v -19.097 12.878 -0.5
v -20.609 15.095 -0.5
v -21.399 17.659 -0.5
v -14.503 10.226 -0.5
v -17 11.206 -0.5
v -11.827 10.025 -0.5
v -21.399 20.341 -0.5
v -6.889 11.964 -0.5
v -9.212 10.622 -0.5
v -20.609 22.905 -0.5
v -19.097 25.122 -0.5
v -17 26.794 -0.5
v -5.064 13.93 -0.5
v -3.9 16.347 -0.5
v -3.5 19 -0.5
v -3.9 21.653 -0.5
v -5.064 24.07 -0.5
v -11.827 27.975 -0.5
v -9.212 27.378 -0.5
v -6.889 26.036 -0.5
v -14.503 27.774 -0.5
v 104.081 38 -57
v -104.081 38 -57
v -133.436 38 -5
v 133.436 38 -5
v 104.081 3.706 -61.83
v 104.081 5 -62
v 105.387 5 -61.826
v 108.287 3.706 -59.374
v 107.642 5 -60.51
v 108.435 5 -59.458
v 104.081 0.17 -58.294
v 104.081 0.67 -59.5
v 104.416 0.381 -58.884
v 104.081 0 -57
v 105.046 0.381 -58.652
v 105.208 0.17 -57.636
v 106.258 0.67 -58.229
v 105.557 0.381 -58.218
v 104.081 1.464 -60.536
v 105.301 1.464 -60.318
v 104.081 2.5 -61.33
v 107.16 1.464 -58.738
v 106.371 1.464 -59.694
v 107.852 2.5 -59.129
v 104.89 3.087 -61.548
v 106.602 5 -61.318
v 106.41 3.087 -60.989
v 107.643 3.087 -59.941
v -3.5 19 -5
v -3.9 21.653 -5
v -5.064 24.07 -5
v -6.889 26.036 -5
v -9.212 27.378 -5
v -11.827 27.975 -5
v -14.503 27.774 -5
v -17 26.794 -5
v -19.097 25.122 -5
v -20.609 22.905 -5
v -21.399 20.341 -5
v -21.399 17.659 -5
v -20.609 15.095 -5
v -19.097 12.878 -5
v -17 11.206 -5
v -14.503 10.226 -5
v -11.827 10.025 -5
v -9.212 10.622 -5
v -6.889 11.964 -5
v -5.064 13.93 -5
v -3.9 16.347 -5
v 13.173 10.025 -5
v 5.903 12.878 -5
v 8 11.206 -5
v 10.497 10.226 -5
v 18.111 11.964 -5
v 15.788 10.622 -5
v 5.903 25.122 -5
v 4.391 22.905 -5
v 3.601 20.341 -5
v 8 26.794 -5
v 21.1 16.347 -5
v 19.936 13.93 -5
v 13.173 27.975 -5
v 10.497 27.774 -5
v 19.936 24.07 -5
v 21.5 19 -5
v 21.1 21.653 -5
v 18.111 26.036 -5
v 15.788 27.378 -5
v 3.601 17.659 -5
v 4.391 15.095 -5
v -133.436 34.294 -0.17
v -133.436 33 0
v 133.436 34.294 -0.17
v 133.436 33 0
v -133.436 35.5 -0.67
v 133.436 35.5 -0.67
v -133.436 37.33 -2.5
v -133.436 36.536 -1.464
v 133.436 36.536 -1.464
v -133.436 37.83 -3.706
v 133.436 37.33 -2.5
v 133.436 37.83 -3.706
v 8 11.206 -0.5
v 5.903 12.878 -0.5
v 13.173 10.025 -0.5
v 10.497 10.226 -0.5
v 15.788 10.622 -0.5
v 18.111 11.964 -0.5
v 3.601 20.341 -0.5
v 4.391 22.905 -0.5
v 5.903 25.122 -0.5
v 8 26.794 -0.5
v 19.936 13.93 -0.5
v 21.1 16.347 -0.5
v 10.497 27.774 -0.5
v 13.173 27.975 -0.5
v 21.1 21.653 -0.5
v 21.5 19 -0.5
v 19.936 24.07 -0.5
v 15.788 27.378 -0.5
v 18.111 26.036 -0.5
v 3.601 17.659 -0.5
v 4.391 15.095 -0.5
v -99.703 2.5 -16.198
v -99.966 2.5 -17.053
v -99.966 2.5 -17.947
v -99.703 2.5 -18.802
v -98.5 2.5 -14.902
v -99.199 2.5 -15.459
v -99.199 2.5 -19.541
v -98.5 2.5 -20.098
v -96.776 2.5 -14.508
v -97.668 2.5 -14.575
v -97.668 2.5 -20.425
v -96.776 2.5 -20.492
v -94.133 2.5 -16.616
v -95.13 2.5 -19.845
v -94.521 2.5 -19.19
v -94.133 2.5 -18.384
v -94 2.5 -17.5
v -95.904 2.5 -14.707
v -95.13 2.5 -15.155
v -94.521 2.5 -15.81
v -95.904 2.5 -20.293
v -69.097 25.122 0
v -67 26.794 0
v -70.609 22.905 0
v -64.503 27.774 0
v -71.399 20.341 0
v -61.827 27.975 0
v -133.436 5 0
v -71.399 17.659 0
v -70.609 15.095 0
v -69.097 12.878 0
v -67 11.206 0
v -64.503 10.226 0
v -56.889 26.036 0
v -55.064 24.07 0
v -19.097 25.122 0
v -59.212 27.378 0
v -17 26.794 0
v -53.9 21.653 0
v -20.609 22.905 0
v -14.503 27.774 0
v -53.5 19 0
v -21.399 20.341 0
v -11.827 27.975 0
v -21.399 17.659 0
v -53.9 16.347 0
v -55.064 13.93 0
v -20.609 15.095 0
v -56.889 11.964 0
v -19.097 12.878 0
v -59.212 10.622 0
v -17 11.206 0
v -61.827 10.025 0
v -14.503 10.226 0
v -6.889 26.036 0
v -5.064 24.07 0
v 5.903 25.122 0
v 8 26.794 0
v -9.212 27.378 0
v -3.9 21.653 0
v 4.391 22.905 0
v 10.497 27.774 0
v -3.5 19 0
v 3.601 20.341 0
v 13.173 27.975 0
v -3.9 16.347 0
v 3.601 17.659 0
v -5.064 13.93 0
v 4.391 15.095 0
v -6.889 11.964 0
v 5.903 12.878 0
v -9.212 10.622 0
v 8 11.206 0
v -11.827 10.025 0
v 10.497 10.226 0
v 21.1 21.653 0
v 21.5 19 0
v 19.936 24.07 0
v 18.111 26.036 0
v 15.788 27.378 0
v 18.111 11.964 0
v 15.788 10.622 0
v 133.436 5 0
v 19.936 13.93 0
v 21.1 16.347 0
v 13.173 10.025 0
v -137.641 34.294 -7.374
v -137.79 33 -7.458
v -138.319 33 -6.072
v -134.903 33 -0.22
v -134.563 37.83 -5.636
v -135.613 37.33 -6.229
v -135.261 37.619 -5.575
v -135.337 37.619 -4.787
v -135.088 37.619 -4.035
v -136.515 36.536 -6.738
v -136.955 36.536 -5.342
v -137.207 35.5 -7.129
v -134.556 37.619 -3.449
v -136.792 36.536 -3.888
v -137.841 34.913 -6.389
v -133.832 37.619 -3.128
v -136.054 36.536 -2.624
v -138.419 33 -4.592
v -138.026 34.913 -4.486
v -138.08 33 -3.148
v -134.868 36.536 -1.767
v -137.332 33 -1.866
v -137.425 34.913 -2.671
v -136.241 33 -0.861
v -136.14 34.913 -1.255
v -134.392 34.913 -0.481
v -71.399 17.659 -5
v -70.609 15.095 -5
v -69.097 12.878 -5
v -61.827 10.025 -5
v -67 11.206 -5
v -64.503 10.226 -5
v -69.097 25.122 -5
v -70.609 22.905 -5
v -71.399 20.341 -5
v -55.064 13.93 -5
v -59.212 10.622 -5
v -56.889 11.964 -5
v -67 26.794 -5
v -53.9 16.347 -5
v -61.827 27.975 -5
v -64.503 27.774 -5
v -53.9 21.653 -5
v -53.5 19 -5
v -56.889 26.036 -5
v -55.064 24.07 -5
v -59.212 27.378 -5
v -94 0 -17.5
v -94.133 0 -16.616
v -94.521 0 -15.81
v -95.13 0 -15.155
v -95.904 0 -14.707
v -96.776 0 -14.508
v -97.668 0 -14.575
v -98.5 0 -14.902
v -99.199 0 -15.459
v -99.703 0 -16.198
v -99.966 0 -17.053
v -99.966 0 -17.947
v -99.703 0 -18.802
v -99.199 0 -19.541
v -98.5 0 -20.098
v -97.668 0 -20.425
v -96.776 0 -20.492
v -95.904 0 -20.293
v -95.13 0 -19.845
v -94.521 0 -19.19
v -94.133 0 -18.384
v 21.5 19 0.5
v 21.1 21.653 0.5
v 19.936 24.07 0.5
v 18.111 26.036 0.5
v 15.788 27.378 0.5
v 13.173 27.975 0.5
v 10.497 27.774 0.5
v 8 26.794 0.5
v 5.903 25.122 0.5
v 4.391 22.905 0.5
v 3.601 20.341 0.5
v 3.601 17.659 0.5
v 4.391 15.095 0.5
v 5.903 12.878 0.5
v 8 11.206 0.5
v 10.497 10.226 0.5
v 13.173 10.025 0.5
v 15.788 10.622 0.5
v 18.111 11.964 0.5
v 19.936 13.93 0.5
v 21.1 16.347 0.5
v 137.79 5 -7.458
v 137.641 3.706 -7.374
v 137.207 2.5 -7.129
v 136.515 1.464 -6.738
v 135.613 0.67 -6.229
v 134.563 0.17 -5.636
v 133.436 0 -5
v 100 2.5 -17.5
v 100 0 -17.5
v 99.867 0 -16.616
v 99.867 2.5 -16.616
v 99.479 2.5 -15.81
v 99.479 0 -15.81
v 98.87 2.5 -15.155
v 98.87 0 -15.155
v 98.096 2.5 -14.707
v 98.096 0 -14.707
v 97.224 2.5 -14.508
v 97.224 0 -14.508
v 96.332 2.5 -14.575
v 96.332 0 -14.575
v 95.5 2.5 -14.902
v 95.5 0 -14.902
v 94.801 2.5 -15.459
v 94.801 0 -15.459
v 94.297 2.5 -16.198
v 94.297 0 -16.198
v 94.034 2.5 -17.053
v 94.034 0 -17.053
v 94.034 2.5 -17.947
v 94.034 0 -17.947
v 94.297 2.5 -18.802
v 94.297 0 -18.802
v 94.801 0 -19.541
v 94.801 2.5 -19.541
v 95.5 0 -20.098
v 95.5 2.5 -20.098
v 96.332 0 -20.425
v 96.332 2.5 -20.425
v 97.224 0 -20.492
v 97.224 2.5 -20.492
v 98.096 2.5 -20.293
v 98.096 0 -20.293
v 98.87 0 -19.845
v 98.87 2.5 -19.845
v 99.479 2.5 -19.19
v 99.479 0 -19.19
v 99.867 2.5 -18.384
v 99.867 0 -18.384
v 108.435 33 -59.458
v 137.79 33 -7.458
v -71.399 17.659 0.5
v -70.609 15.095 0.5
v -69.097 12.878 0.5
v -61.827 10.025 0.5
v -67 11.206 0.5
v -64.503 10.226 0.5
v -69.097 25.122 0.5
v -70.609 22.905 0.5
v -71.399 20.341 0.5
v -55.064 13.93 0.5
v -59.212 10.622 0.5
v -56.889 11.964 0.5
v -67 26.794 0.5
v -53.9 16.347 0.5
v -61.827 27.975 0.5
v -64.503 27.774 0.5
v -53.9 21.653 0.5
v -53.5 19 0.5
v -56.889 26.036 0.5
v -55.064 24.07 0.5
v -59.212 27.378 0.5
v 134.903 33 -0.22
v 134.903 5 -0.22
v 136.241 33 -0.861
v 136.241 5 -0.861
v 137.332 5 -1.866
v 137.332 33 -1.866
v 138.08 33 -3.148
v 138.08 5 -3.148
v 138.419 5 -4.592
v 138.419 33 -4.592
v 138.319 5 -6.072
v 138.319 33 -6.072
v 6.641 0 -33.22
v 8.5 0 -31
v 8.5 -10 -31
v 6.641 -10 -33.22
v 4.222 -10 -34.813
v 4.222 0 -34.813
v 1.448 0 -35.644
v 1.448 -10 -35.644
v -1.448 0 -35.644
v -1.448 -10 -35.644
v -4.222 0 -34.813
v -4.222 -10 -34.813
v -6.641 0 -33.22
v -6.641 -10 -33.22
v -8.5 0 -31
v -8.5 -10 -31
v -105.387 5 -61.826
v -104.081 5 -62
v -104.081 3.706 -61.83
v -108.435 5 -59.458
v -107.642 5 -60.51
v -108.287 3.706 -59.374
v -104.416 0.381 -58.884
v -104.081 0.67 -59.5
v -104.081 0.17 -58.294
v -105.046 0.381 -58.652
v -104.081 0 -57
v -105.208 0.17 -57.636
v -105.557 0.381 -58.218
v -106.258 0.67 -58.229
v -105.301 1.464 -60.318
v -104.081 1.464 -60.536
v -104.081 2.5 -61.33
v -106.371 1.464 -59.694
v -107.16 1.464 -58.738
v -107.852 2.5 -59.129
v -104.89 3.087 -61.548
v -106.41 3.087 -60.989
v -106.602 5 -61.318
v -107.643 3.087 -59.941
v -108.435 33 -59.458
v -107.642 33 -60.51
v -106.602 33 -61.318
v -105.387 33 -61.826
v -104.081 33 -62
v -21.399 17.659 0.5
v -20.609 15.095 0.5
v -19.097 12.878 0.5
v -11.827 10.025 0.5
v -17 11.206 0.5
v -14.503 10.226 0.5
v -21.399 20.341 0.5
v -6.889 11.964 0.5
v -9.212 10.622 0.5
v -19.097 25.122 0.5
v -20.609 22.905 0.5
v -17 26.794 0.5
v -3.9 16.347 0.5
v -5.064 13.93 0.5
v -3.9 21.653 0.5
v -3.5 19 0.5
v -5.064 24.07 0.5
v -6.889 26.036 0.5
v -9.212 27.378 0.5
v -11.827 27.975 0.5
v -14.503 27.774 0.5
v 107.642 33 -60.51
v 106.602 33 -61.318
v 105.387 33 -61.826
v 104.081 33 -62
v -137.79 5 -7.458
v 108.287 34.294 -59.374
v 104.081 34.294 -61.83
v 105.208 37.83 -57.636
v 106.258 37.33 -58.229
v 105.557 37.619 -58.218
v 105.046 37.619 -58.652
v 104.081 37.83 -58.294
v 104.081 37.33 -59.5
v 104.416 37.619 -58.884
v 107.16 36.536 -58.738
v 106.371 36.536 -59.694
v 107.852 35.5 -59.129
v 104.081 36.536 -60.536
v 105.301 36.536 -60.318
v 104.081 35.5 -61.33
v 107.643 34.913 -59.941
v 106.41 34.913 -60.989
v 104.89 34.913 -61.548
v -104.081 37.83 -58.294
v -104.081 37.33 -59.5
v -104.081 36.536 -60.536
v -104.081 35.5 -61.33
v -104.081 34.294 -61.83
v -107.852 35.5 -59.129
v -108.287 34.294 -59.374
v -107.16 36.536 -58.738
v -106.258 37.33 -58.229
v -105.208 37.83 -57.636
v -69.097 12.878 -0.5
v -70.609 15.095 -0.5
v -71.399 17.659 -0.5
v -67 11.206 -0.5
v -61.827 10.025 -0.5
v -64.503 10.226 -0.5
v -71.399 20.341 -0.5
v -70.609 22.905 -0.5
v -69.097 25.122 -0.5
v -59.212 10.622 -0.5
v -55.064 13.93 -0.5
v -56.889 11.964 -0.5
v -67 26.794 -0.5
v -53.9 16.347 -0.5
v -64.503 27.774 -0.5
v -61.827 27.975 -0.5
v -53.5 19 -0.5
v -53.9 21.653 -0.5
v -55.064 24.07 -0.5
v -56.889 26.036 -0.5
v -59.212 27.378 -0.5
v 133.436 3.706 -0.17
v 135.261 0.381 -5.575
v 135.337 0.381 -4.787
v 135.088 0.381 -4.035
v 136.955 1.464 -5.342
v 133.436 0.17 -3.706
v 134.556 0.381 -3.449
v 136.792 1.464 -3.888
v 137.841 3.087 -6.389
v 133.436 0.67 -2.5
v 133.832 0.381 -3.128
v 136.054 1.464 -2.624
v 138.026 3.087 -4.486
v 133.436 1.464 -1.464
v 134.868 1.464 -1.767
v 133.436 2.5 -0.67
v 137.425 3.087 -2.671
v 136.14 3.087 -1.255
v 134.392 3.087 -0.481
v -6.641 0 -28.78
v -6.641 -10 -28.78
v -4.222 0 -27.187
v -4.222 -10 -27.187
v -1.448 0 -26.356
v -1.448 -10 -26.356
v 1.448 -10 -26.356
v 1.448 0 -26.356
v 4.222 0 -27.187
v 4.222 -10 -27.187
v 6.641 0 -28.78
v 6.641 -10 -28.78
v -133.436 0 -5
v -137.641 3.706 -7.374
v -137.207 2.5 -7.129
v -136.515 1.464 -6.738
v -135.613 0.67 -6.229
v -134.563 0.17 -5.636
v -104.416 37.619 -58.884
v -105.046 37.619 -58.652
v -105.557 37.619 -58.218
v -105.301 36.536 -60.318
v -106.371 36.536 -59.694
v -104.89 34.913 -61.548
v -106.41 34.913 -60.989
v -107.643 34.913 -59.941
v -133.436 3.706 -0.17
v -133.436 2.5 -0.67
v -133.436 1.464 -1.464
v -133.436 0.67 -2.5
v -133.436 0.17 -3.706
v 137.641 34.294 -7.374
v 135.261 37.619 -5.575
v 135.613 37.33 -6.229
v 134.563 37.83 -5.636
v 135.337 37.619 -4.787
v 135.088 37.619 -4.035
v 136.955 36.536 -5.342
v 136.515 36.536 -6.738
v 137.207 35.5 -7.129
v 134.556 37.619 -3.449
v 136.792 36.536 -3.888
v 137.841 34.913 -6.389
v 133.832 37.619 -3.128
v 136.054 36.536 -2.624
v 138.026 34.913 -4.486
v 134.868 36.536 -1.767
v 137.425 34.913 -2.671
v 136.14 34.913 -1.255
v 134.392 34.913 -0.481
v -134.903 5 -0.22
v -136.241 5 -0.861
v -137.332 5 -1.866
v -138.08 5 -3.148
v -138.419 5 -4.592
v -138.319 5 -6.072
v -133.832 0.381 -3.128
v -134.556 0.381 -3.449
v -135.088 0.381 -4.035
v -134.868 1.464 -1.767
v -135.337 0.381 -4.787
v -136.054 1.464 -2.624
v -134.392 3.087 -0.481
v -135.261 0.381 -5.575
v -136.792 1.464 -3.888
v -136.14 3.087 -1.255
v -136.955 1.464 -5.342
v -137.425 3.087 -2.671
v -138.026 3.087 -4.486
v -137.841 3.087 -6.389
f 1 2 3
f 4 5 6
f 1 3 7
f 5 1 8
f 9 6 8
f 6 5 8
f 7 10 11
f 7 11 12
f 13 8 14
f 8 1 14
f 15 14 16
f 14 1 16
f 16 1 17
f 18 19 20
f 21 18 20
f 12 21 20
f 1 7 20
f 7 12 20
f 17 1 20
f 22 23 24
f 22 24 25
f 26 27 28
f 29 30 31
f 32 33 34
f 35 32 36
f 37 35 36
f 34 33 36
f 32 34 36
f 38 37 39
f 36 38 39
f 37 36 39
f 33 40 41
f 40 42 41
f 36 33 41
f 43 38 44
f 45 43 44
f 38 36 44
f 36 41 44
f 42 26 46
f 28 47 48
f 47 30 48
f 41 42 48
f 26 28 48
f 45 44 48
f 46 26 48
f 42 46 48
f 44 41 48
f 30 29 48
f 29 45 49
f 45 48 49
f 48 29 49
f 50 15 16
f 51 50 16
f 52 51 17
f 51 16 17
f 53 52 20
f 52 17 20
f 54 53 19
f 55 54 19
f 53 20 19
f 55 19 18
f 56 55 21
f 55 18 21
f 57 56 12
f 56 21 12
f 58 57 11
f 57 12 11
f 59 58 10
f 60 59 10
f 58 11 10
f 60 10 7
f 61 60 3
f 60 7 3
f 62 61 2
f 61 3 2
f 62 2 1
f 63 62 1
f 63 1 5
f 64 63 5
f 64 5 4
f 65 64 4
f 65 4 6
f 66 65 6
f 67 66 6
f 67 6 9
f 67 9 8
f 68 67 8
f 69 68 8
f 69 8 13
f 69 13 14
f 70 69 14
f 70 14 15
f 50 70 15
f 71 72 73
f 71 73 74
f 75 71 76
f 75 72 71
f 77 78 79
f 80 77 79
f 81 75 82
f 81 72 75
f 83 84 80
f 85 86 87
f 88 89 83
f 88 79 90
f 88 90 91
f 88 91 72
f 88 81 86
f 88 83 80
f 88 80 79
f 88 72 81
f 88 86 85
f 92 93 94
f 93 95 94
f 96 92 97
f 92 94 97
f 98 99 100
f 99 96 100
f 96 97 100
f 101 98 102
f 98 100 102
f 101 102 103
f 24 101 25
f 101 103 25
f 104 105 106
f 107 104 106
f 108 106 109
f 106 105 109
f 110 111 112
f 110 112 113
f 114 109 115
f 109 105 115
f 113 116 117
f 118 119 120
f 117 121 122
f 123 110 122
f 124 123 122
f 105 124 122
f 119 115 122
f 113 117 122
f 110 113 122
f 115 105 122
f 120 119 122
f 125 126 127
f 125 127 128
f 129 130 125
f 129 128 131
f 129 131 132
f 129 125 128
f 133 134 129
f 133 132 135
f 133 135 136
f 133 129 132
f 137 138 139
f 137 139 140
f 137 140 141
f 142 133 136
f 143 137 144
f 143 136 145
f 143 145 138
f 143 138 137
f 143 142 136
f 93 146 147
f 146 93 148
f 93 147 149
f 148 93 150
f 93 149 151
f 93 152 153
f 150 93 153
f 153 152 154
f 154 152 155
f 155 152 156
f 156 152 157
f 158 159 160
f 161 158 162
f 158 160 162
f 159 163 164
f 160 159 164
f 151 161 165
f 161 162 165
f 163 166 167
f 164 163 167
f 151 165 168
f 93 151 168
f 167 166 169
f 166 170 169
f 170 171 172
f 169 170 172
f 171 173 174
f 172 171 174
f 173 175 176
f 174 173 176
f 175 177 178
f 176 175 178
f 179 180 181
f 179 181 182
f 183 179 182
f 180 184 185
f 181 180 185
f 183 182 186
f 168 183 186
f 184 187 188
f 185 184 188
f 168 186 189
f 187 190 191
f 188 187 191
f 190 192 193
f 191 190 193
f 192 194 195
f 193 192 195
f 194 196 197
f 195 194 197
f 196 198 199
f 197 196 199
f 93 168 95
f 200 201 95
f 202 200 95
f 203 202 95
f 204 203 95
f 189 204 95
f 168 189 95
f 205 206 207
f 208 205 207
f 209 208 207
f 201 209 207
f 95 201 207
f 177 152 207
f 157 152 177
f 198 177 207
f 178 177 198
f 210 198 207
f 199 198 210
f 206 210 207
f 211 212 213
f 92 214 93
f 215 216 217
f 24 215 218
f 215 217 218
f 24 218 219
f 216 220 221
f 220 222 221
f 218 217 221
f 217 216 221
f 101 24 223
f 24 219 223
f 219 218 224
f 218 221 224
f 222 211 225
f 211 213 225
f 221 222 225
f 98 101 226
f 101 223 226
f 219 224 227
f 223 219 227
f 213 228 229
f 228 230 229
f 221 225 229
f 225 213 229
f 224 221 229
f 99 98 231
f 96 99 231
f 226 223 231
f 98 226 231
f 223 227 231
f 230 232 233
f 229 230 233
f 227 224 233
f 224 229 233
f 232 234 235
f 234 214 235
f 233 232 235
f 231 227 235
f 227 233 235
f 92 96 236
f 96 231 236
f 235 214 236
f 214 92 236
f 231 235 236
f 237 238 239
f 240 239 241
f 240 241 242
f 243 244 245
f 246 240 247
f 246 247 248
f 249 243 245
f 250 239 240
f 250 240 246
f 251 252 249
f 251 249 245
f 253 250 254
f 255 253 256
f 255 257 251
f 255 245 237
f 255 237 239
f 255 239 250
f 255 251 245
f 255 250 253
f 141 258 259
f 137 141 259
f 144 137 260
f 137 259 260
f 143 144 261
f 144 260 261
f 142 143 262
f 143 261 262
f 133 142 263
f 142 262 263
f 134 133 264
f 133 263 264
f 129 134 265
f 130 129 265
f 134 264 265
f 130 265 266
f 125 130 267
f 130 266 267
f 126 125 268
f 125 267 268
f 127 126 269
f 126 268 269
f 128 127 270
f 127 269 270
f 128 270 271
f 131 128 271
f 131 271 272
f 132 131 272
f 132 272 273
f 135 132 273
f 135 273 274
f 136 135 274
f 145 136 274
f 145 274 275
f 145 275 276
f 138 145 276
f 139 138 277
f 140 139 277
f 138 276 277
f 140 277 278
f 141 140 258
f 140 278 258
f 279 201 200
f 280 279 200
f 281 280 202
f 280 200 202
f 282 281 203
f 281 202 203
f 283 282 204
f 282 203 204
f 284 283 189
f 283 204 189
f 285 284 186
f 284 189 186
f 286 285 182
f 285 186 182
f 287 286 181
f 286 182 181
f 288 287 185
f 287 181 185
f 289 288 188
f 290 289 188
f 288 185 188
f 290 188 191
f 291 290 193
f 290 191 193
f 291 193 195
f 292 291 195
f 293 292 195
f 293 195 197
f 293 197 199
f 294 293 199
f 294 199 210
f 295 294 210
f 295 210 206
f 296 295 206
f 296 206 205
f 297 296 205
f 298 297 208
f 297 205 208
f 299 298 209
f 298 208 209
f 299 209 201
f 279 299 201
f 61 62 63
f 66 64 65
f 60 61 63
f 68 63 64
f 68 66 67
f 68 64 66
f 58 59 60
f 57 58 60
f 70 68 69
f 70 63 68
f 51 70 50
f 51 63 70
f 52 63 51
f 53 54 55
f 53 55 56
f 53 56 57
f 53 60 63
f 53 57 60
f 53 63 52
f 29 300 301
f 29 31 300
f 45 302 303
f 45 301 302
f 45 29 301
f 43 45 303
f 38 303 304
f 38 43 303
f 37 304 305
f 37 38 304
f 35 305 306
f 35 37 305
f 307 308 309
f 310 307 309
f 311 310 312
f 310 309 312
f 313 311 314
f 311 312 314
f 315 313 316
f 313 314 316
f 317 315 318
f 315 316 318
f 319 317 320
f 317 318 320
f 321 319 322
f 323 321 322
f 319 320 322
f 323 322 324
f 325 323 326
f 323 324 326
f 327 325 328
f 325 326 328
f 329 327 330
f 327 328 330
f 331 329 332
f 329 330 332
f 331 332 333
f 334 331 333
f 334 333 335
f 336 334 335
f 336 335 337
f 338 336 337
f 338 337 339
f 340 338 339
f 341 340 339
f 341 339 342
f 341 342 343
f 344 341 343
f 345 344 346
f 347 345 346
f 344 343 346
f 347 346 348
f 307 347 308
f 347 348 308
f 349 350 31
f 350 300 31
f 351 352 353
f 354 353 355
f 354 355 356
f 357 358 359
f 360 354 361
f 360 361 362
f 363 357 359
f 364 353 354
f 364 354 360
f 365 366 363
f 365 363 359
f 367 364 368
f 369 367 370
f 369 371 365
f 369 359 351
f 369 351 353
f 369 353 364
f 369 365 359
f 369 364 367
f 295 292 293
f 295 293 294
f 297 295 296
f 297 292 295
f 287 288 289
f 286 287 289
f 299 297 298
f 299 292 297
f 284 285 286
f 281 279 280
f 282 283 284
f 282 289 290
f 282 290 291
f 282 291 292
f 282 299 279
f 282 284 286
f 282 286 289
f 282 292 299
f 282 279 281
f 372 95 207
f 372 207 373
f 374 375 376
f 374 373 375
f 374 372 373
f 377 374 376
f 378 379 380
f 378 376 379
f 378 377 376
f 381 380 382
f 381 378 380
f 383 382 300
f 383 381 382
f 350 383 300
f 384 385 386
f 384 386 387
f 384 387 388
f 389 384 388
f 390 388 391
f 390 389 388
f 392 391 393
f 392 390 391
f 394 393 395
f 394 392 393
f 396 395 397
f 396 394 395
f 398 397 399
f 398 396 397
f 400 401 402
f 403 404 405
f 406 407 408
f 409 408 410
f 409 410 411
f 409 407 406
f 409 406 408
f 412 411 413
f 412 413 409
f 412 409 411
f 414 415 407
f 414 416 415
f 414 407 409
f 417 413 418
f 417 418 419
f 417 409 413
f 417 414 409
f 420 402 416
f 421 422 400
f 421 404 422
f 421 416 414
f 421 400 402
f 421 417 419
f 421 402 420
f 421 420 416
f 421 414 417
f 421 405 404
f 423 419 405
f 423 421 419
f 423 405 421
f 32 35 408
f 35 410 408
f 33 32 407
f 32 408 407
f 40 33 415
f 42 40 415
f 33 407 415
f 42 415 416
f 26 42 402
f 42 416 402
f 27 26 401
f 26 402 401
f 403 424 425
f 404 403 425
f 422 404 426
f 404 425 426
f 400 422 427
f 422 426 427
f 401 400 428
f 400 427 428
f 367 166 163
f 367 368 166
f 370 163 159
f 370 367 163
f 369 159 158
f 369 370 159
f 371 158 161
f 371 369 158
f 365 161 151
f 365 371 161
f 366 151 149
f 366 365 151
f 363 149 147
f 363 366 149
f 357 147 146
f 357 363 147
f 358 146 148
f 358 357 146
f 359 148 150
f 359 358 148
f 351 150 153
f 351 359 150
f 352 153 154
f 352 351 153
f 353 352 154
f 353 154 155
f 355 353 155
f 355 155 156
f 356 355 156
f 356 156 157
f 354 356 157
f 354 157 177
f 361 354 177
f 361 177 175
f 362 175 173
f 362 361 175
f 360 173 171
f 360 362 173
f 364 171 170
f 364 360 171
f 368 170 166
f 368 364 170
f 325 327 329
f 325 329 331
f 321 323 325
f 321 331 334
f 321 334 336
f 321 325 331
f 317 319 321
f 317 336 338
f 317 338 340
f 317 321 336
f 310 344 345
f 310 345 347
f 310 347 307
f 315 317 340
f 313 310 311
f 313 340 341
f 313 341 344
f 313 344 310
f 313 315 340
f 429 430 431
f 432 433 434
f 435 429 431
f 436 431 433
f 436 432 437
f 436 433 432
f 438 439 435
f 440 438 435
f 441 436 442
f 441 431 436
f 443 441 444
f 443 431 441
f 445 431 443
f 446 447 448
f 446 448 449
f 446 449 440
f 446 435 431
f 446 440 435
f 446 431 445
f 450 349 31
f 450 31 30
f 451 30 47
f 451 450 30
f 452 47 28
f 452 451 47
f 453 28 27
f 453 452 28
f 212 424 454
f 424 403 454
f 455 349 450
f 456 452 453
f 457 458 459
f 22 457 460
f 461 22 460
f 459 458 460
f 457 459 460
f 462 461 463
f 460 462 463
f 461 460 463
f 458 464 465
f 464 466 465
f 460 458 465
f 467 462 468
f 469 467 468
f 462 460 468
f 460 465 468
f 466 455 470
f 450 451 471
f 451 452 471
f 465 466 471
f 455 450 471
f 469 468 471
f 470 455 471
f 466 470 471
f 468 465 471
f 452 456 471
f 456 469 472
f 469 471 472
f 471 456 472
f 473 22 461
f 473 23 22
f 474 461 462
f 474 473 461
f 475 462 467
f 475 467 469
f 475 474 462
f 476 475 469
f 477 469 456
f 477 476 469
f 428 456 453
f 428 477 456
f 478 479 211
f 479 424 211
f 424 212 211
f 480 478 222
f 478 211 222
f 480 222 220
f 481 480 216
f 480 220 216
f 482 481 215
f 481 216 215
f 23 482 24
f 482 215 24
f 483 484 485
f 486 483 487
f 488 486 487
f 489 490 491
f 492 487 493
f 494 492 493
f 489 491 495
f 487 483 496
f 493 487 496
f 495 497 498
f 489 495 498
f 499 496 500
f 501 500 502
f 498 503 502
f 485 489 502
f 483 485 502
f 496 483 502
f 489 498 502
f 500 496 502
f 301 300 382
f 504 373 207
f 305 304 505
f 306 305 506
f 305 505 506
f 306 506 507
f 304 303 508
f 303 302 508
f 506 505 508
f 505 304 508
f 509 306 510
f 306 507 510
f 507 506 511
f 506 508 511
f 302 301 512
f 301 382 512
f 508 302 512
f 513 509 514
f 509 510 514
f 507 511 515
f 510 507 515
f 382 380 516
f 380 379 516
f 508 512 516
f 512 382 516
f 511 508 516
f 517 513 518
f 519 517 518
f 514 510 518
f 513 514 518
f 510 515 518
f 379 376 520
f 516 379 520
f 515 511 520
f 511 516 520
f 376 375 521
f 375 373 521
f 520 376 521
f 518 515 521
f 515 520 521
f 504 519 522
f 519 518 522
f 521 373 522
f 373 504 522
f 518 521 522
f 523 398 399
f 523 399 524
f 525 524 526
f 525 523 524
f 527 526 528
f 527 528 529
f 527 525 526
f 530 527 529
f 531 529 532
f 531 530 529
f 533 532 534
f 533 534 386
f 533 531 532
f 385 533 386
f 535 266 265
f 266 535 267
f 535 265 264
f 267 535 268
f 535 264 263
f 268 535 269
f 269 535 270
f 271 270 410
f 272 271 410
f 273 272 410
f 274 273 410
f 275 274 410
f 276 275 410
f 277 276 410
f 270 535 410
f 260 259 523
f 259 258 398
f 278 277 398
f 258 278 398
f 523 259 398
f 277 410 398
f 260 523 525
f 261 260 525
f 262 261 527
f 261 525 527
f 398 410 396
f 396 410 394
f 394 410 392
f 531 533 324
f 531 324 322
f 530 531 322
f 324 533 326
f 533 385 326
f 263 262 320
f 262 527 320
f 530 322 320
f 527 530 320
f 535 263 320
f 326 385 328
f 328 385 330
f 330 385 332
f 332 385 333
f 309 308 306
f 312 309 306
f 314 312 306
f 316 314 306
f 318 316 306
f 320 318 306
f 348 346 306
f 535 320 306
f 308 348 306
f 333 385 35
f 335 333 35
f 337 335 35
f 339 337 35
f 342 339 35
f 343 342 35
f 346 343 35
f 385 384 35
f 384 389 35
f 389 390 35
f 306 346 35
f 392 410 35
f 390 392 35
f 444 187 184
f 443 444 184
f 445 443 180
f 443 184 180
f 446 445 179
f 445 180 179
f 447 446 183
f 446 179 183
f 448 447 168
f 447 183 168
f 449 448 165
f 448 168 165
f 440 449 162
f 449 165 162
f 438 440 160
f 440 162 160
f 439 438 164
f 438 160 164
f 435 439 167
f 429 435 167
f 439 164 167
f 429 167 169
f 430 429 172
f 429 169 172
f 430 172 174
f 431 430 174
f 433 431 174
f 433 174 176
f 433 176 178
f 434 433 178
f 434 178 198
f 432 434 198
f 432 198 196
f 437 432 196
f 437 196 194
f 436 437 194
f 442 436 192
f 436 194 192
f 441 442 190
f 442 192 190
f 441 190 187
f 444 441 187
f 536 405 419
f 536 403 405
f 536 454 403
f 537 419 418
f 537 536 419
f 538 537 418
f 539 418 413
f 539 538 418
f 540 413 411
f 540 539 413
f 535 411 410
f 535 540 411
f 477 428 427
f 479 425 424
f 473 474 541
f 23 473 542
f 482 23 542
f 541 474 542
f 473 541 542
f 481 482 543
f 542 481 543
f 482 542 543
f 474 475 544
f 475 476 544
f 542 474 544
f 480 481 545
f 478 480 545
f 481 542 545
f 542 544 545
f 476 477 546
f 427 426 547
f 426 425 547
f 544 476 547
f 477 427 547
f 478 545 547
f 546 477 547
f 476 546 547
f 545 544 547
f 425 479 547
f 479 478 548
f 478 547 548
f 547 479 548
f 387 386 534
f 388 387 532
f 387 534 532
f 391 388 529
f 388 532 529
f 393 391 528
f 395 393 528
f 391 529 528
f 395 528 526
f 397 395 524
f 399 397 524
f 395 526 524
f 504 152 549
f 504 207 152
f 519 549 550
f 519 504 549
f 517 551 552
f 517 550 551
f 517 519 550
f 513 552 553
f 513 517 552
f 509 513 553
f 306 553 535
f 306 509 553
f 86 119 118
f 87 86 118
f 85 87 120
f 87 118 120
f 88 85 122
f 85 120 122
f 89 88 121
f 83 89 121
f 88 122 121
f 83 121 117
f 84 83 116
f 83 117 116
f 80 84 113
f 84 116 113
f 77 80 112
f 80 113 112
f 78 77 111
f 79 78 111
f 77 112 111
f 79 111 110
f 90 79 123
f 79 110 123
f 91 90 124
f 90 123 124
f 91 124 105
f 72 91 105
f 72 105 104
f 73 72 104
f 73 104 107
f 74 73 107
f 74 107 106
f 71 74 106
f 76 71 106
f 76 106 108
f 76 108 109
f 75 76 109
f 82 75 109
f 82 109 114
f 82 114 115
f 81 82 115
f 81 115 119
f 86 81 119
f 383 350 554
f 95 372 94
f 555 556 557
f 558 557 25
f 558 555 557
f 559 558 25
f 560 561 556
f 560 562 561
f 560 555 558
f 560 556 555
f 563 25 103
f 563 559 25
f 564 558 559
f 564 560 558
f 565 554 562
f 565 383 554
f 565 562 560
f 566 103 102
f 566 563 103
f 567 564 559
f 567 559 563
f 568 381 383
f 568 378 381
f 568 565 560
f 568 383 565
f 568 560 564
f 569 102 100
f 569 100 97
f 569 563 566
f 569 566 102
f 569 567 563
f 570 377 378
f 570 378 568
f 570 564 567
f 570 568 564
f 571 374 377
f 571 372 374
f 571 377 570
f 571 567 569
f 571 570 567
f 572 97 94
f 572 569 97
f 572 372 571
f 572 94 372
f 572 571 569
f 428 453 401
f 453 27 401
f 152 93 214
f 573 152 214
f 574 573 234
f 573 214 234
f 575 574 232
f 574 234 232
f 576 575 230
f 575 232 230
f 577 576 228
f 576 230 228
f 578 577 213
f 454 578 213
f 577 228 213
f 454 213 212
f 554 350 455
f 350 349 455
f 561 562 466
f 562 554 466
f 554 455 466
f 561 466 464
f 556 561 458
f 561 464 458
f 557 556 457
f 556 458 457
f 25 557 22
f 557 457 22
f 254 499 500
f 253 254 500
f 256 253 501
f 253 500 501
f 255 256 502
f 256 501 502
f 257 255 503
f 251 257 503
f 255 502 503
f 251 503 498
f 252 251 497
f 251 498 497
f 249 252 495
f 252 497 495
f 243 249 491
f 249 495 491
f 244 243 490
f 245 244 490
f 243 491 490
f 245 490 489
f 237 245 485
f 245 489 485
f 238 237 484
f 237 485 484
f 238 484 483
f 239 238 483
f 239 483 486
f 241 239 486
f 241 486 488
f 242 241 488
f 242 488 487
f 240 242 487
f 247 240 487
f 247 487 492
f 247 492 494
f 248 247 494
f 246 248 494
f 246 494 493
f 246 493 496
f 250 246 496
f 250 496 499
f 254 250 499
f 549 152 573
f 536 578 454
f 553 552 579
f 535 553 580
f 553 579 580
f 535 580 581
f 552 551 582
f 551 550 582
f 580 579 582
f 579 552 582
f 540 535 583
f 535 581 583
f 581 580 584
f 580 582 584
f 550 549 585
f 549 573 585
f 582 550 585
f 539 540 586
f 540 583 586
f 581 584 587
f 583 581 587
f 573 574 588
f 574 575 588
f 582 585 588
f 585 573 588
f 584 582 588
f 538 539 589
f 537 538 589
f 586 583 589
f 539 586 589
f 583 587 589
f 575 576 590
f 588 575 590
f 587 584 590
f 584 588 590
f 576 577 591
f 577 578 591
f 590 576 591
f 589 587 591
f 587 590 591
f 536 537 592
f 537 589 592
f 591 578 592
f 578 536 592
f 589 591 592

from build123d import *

# Parameters (mm, degrees)
BOSS_EXTRUDE1_DEPTH = 38
BOSS_EXTRUDE2_DEPTH = 10
FILLET1_R           = 5
SKETCH3_R           = 9
CUT_EXTRUDE1_DEPTH  = 5
SKETCH5_R           = 9
BOSS_EXTRUDE3_DEPTH = 0.5
SKETCH6_R           = 3
CUT_EXTRUDE2_DEPTH  = 2.5


with BuildPart() as part:
    # Sketch1 → Boss-Extrude1 (new body)
    with BuildSketch(Plane(origin=(0, 0, 0), x_dir=(1, 0, 0), z_dir=(0, 1, 0))):
        Polygon((-142, 0), (142, 0), (107, 62), (-107, 62), align=None)
    extrude(amount=BOSS_EXTRUDE1_DEPTH)

    # Sketch2 → Boss-Extrude2 (add)
    with BuildSketch(Plane.XZ):
        with BuildLine():
            ThreePointArc((8.5, -31), (0, -35.75), (-8.5, -31))
            ThreePointArc((-8.5, -31), (0, -26.25), (8.5, -31))
        make_face()
    extrude(amount=BOSS_EXTRUDE2_DEPTH)

    # Fillet1
    fillet1_edges = [part.edges().sort_by_distance(p)[0] for p in [
        (124.5, 38, -31),
        (0, 38, -62),
        (-124.5, 38, -31),
        (0, 0, -62),
        (124.5, 0, -31),
        (0, 0, 0),
        (-124.5, 0, -31),
        (0, 38, 0),
        (-107, 19, -62),
        (107, 19, -62),
        (142, 19, 0),
        (-142, 19, 0),
    ]]
    fillet(fillet1_edges, radius=FILLET1_R)

    # Sketch3 → Cut-Extrude1 (cut)
    with BuildSketch(Plane.XY):
        with Locations((12.5, 19)):
            Circle(SKETCH3_R)
        with Locations((-12.5, 19)):
            Circle(SKETCH3_R)
        with Locations((-62.5, 19)):
            Circle(SKETCH3_R)
    extrude(amount=-CUT_EXTRUDE1_DEPTH, mode=Mode.SUBTRACT)

    # Sketch5 → Boss-Extrude3 (add, symmetric)
    with BuildSketch(Plane.XY):
        with Locations((-12.5, 19)):
            Circle(SKETCH5_R)
        with Locations((12.5, 19)):
            Circle(SKETCH5_R)
        with Locations((-62.5, 19)):
            Circle(SKETCH5_R)
    extrude(amount=BOSS_EXTRUDE3_DEPTH, both=True)

    # Sketch6 → Cut-Extrude2 (cut)
    with BuildSketch(Plane.XZ):
        with Locations((-97, -17.5)):
            Circle(SKETCH6_R)
        with Locations((97, -17.5)):
            Circle(SKETCH6_R)
    extrude(amount=-CUT_EXTRUDE2_DEPTH, mode=Mode.SUBTRACT)


solid = part.part
